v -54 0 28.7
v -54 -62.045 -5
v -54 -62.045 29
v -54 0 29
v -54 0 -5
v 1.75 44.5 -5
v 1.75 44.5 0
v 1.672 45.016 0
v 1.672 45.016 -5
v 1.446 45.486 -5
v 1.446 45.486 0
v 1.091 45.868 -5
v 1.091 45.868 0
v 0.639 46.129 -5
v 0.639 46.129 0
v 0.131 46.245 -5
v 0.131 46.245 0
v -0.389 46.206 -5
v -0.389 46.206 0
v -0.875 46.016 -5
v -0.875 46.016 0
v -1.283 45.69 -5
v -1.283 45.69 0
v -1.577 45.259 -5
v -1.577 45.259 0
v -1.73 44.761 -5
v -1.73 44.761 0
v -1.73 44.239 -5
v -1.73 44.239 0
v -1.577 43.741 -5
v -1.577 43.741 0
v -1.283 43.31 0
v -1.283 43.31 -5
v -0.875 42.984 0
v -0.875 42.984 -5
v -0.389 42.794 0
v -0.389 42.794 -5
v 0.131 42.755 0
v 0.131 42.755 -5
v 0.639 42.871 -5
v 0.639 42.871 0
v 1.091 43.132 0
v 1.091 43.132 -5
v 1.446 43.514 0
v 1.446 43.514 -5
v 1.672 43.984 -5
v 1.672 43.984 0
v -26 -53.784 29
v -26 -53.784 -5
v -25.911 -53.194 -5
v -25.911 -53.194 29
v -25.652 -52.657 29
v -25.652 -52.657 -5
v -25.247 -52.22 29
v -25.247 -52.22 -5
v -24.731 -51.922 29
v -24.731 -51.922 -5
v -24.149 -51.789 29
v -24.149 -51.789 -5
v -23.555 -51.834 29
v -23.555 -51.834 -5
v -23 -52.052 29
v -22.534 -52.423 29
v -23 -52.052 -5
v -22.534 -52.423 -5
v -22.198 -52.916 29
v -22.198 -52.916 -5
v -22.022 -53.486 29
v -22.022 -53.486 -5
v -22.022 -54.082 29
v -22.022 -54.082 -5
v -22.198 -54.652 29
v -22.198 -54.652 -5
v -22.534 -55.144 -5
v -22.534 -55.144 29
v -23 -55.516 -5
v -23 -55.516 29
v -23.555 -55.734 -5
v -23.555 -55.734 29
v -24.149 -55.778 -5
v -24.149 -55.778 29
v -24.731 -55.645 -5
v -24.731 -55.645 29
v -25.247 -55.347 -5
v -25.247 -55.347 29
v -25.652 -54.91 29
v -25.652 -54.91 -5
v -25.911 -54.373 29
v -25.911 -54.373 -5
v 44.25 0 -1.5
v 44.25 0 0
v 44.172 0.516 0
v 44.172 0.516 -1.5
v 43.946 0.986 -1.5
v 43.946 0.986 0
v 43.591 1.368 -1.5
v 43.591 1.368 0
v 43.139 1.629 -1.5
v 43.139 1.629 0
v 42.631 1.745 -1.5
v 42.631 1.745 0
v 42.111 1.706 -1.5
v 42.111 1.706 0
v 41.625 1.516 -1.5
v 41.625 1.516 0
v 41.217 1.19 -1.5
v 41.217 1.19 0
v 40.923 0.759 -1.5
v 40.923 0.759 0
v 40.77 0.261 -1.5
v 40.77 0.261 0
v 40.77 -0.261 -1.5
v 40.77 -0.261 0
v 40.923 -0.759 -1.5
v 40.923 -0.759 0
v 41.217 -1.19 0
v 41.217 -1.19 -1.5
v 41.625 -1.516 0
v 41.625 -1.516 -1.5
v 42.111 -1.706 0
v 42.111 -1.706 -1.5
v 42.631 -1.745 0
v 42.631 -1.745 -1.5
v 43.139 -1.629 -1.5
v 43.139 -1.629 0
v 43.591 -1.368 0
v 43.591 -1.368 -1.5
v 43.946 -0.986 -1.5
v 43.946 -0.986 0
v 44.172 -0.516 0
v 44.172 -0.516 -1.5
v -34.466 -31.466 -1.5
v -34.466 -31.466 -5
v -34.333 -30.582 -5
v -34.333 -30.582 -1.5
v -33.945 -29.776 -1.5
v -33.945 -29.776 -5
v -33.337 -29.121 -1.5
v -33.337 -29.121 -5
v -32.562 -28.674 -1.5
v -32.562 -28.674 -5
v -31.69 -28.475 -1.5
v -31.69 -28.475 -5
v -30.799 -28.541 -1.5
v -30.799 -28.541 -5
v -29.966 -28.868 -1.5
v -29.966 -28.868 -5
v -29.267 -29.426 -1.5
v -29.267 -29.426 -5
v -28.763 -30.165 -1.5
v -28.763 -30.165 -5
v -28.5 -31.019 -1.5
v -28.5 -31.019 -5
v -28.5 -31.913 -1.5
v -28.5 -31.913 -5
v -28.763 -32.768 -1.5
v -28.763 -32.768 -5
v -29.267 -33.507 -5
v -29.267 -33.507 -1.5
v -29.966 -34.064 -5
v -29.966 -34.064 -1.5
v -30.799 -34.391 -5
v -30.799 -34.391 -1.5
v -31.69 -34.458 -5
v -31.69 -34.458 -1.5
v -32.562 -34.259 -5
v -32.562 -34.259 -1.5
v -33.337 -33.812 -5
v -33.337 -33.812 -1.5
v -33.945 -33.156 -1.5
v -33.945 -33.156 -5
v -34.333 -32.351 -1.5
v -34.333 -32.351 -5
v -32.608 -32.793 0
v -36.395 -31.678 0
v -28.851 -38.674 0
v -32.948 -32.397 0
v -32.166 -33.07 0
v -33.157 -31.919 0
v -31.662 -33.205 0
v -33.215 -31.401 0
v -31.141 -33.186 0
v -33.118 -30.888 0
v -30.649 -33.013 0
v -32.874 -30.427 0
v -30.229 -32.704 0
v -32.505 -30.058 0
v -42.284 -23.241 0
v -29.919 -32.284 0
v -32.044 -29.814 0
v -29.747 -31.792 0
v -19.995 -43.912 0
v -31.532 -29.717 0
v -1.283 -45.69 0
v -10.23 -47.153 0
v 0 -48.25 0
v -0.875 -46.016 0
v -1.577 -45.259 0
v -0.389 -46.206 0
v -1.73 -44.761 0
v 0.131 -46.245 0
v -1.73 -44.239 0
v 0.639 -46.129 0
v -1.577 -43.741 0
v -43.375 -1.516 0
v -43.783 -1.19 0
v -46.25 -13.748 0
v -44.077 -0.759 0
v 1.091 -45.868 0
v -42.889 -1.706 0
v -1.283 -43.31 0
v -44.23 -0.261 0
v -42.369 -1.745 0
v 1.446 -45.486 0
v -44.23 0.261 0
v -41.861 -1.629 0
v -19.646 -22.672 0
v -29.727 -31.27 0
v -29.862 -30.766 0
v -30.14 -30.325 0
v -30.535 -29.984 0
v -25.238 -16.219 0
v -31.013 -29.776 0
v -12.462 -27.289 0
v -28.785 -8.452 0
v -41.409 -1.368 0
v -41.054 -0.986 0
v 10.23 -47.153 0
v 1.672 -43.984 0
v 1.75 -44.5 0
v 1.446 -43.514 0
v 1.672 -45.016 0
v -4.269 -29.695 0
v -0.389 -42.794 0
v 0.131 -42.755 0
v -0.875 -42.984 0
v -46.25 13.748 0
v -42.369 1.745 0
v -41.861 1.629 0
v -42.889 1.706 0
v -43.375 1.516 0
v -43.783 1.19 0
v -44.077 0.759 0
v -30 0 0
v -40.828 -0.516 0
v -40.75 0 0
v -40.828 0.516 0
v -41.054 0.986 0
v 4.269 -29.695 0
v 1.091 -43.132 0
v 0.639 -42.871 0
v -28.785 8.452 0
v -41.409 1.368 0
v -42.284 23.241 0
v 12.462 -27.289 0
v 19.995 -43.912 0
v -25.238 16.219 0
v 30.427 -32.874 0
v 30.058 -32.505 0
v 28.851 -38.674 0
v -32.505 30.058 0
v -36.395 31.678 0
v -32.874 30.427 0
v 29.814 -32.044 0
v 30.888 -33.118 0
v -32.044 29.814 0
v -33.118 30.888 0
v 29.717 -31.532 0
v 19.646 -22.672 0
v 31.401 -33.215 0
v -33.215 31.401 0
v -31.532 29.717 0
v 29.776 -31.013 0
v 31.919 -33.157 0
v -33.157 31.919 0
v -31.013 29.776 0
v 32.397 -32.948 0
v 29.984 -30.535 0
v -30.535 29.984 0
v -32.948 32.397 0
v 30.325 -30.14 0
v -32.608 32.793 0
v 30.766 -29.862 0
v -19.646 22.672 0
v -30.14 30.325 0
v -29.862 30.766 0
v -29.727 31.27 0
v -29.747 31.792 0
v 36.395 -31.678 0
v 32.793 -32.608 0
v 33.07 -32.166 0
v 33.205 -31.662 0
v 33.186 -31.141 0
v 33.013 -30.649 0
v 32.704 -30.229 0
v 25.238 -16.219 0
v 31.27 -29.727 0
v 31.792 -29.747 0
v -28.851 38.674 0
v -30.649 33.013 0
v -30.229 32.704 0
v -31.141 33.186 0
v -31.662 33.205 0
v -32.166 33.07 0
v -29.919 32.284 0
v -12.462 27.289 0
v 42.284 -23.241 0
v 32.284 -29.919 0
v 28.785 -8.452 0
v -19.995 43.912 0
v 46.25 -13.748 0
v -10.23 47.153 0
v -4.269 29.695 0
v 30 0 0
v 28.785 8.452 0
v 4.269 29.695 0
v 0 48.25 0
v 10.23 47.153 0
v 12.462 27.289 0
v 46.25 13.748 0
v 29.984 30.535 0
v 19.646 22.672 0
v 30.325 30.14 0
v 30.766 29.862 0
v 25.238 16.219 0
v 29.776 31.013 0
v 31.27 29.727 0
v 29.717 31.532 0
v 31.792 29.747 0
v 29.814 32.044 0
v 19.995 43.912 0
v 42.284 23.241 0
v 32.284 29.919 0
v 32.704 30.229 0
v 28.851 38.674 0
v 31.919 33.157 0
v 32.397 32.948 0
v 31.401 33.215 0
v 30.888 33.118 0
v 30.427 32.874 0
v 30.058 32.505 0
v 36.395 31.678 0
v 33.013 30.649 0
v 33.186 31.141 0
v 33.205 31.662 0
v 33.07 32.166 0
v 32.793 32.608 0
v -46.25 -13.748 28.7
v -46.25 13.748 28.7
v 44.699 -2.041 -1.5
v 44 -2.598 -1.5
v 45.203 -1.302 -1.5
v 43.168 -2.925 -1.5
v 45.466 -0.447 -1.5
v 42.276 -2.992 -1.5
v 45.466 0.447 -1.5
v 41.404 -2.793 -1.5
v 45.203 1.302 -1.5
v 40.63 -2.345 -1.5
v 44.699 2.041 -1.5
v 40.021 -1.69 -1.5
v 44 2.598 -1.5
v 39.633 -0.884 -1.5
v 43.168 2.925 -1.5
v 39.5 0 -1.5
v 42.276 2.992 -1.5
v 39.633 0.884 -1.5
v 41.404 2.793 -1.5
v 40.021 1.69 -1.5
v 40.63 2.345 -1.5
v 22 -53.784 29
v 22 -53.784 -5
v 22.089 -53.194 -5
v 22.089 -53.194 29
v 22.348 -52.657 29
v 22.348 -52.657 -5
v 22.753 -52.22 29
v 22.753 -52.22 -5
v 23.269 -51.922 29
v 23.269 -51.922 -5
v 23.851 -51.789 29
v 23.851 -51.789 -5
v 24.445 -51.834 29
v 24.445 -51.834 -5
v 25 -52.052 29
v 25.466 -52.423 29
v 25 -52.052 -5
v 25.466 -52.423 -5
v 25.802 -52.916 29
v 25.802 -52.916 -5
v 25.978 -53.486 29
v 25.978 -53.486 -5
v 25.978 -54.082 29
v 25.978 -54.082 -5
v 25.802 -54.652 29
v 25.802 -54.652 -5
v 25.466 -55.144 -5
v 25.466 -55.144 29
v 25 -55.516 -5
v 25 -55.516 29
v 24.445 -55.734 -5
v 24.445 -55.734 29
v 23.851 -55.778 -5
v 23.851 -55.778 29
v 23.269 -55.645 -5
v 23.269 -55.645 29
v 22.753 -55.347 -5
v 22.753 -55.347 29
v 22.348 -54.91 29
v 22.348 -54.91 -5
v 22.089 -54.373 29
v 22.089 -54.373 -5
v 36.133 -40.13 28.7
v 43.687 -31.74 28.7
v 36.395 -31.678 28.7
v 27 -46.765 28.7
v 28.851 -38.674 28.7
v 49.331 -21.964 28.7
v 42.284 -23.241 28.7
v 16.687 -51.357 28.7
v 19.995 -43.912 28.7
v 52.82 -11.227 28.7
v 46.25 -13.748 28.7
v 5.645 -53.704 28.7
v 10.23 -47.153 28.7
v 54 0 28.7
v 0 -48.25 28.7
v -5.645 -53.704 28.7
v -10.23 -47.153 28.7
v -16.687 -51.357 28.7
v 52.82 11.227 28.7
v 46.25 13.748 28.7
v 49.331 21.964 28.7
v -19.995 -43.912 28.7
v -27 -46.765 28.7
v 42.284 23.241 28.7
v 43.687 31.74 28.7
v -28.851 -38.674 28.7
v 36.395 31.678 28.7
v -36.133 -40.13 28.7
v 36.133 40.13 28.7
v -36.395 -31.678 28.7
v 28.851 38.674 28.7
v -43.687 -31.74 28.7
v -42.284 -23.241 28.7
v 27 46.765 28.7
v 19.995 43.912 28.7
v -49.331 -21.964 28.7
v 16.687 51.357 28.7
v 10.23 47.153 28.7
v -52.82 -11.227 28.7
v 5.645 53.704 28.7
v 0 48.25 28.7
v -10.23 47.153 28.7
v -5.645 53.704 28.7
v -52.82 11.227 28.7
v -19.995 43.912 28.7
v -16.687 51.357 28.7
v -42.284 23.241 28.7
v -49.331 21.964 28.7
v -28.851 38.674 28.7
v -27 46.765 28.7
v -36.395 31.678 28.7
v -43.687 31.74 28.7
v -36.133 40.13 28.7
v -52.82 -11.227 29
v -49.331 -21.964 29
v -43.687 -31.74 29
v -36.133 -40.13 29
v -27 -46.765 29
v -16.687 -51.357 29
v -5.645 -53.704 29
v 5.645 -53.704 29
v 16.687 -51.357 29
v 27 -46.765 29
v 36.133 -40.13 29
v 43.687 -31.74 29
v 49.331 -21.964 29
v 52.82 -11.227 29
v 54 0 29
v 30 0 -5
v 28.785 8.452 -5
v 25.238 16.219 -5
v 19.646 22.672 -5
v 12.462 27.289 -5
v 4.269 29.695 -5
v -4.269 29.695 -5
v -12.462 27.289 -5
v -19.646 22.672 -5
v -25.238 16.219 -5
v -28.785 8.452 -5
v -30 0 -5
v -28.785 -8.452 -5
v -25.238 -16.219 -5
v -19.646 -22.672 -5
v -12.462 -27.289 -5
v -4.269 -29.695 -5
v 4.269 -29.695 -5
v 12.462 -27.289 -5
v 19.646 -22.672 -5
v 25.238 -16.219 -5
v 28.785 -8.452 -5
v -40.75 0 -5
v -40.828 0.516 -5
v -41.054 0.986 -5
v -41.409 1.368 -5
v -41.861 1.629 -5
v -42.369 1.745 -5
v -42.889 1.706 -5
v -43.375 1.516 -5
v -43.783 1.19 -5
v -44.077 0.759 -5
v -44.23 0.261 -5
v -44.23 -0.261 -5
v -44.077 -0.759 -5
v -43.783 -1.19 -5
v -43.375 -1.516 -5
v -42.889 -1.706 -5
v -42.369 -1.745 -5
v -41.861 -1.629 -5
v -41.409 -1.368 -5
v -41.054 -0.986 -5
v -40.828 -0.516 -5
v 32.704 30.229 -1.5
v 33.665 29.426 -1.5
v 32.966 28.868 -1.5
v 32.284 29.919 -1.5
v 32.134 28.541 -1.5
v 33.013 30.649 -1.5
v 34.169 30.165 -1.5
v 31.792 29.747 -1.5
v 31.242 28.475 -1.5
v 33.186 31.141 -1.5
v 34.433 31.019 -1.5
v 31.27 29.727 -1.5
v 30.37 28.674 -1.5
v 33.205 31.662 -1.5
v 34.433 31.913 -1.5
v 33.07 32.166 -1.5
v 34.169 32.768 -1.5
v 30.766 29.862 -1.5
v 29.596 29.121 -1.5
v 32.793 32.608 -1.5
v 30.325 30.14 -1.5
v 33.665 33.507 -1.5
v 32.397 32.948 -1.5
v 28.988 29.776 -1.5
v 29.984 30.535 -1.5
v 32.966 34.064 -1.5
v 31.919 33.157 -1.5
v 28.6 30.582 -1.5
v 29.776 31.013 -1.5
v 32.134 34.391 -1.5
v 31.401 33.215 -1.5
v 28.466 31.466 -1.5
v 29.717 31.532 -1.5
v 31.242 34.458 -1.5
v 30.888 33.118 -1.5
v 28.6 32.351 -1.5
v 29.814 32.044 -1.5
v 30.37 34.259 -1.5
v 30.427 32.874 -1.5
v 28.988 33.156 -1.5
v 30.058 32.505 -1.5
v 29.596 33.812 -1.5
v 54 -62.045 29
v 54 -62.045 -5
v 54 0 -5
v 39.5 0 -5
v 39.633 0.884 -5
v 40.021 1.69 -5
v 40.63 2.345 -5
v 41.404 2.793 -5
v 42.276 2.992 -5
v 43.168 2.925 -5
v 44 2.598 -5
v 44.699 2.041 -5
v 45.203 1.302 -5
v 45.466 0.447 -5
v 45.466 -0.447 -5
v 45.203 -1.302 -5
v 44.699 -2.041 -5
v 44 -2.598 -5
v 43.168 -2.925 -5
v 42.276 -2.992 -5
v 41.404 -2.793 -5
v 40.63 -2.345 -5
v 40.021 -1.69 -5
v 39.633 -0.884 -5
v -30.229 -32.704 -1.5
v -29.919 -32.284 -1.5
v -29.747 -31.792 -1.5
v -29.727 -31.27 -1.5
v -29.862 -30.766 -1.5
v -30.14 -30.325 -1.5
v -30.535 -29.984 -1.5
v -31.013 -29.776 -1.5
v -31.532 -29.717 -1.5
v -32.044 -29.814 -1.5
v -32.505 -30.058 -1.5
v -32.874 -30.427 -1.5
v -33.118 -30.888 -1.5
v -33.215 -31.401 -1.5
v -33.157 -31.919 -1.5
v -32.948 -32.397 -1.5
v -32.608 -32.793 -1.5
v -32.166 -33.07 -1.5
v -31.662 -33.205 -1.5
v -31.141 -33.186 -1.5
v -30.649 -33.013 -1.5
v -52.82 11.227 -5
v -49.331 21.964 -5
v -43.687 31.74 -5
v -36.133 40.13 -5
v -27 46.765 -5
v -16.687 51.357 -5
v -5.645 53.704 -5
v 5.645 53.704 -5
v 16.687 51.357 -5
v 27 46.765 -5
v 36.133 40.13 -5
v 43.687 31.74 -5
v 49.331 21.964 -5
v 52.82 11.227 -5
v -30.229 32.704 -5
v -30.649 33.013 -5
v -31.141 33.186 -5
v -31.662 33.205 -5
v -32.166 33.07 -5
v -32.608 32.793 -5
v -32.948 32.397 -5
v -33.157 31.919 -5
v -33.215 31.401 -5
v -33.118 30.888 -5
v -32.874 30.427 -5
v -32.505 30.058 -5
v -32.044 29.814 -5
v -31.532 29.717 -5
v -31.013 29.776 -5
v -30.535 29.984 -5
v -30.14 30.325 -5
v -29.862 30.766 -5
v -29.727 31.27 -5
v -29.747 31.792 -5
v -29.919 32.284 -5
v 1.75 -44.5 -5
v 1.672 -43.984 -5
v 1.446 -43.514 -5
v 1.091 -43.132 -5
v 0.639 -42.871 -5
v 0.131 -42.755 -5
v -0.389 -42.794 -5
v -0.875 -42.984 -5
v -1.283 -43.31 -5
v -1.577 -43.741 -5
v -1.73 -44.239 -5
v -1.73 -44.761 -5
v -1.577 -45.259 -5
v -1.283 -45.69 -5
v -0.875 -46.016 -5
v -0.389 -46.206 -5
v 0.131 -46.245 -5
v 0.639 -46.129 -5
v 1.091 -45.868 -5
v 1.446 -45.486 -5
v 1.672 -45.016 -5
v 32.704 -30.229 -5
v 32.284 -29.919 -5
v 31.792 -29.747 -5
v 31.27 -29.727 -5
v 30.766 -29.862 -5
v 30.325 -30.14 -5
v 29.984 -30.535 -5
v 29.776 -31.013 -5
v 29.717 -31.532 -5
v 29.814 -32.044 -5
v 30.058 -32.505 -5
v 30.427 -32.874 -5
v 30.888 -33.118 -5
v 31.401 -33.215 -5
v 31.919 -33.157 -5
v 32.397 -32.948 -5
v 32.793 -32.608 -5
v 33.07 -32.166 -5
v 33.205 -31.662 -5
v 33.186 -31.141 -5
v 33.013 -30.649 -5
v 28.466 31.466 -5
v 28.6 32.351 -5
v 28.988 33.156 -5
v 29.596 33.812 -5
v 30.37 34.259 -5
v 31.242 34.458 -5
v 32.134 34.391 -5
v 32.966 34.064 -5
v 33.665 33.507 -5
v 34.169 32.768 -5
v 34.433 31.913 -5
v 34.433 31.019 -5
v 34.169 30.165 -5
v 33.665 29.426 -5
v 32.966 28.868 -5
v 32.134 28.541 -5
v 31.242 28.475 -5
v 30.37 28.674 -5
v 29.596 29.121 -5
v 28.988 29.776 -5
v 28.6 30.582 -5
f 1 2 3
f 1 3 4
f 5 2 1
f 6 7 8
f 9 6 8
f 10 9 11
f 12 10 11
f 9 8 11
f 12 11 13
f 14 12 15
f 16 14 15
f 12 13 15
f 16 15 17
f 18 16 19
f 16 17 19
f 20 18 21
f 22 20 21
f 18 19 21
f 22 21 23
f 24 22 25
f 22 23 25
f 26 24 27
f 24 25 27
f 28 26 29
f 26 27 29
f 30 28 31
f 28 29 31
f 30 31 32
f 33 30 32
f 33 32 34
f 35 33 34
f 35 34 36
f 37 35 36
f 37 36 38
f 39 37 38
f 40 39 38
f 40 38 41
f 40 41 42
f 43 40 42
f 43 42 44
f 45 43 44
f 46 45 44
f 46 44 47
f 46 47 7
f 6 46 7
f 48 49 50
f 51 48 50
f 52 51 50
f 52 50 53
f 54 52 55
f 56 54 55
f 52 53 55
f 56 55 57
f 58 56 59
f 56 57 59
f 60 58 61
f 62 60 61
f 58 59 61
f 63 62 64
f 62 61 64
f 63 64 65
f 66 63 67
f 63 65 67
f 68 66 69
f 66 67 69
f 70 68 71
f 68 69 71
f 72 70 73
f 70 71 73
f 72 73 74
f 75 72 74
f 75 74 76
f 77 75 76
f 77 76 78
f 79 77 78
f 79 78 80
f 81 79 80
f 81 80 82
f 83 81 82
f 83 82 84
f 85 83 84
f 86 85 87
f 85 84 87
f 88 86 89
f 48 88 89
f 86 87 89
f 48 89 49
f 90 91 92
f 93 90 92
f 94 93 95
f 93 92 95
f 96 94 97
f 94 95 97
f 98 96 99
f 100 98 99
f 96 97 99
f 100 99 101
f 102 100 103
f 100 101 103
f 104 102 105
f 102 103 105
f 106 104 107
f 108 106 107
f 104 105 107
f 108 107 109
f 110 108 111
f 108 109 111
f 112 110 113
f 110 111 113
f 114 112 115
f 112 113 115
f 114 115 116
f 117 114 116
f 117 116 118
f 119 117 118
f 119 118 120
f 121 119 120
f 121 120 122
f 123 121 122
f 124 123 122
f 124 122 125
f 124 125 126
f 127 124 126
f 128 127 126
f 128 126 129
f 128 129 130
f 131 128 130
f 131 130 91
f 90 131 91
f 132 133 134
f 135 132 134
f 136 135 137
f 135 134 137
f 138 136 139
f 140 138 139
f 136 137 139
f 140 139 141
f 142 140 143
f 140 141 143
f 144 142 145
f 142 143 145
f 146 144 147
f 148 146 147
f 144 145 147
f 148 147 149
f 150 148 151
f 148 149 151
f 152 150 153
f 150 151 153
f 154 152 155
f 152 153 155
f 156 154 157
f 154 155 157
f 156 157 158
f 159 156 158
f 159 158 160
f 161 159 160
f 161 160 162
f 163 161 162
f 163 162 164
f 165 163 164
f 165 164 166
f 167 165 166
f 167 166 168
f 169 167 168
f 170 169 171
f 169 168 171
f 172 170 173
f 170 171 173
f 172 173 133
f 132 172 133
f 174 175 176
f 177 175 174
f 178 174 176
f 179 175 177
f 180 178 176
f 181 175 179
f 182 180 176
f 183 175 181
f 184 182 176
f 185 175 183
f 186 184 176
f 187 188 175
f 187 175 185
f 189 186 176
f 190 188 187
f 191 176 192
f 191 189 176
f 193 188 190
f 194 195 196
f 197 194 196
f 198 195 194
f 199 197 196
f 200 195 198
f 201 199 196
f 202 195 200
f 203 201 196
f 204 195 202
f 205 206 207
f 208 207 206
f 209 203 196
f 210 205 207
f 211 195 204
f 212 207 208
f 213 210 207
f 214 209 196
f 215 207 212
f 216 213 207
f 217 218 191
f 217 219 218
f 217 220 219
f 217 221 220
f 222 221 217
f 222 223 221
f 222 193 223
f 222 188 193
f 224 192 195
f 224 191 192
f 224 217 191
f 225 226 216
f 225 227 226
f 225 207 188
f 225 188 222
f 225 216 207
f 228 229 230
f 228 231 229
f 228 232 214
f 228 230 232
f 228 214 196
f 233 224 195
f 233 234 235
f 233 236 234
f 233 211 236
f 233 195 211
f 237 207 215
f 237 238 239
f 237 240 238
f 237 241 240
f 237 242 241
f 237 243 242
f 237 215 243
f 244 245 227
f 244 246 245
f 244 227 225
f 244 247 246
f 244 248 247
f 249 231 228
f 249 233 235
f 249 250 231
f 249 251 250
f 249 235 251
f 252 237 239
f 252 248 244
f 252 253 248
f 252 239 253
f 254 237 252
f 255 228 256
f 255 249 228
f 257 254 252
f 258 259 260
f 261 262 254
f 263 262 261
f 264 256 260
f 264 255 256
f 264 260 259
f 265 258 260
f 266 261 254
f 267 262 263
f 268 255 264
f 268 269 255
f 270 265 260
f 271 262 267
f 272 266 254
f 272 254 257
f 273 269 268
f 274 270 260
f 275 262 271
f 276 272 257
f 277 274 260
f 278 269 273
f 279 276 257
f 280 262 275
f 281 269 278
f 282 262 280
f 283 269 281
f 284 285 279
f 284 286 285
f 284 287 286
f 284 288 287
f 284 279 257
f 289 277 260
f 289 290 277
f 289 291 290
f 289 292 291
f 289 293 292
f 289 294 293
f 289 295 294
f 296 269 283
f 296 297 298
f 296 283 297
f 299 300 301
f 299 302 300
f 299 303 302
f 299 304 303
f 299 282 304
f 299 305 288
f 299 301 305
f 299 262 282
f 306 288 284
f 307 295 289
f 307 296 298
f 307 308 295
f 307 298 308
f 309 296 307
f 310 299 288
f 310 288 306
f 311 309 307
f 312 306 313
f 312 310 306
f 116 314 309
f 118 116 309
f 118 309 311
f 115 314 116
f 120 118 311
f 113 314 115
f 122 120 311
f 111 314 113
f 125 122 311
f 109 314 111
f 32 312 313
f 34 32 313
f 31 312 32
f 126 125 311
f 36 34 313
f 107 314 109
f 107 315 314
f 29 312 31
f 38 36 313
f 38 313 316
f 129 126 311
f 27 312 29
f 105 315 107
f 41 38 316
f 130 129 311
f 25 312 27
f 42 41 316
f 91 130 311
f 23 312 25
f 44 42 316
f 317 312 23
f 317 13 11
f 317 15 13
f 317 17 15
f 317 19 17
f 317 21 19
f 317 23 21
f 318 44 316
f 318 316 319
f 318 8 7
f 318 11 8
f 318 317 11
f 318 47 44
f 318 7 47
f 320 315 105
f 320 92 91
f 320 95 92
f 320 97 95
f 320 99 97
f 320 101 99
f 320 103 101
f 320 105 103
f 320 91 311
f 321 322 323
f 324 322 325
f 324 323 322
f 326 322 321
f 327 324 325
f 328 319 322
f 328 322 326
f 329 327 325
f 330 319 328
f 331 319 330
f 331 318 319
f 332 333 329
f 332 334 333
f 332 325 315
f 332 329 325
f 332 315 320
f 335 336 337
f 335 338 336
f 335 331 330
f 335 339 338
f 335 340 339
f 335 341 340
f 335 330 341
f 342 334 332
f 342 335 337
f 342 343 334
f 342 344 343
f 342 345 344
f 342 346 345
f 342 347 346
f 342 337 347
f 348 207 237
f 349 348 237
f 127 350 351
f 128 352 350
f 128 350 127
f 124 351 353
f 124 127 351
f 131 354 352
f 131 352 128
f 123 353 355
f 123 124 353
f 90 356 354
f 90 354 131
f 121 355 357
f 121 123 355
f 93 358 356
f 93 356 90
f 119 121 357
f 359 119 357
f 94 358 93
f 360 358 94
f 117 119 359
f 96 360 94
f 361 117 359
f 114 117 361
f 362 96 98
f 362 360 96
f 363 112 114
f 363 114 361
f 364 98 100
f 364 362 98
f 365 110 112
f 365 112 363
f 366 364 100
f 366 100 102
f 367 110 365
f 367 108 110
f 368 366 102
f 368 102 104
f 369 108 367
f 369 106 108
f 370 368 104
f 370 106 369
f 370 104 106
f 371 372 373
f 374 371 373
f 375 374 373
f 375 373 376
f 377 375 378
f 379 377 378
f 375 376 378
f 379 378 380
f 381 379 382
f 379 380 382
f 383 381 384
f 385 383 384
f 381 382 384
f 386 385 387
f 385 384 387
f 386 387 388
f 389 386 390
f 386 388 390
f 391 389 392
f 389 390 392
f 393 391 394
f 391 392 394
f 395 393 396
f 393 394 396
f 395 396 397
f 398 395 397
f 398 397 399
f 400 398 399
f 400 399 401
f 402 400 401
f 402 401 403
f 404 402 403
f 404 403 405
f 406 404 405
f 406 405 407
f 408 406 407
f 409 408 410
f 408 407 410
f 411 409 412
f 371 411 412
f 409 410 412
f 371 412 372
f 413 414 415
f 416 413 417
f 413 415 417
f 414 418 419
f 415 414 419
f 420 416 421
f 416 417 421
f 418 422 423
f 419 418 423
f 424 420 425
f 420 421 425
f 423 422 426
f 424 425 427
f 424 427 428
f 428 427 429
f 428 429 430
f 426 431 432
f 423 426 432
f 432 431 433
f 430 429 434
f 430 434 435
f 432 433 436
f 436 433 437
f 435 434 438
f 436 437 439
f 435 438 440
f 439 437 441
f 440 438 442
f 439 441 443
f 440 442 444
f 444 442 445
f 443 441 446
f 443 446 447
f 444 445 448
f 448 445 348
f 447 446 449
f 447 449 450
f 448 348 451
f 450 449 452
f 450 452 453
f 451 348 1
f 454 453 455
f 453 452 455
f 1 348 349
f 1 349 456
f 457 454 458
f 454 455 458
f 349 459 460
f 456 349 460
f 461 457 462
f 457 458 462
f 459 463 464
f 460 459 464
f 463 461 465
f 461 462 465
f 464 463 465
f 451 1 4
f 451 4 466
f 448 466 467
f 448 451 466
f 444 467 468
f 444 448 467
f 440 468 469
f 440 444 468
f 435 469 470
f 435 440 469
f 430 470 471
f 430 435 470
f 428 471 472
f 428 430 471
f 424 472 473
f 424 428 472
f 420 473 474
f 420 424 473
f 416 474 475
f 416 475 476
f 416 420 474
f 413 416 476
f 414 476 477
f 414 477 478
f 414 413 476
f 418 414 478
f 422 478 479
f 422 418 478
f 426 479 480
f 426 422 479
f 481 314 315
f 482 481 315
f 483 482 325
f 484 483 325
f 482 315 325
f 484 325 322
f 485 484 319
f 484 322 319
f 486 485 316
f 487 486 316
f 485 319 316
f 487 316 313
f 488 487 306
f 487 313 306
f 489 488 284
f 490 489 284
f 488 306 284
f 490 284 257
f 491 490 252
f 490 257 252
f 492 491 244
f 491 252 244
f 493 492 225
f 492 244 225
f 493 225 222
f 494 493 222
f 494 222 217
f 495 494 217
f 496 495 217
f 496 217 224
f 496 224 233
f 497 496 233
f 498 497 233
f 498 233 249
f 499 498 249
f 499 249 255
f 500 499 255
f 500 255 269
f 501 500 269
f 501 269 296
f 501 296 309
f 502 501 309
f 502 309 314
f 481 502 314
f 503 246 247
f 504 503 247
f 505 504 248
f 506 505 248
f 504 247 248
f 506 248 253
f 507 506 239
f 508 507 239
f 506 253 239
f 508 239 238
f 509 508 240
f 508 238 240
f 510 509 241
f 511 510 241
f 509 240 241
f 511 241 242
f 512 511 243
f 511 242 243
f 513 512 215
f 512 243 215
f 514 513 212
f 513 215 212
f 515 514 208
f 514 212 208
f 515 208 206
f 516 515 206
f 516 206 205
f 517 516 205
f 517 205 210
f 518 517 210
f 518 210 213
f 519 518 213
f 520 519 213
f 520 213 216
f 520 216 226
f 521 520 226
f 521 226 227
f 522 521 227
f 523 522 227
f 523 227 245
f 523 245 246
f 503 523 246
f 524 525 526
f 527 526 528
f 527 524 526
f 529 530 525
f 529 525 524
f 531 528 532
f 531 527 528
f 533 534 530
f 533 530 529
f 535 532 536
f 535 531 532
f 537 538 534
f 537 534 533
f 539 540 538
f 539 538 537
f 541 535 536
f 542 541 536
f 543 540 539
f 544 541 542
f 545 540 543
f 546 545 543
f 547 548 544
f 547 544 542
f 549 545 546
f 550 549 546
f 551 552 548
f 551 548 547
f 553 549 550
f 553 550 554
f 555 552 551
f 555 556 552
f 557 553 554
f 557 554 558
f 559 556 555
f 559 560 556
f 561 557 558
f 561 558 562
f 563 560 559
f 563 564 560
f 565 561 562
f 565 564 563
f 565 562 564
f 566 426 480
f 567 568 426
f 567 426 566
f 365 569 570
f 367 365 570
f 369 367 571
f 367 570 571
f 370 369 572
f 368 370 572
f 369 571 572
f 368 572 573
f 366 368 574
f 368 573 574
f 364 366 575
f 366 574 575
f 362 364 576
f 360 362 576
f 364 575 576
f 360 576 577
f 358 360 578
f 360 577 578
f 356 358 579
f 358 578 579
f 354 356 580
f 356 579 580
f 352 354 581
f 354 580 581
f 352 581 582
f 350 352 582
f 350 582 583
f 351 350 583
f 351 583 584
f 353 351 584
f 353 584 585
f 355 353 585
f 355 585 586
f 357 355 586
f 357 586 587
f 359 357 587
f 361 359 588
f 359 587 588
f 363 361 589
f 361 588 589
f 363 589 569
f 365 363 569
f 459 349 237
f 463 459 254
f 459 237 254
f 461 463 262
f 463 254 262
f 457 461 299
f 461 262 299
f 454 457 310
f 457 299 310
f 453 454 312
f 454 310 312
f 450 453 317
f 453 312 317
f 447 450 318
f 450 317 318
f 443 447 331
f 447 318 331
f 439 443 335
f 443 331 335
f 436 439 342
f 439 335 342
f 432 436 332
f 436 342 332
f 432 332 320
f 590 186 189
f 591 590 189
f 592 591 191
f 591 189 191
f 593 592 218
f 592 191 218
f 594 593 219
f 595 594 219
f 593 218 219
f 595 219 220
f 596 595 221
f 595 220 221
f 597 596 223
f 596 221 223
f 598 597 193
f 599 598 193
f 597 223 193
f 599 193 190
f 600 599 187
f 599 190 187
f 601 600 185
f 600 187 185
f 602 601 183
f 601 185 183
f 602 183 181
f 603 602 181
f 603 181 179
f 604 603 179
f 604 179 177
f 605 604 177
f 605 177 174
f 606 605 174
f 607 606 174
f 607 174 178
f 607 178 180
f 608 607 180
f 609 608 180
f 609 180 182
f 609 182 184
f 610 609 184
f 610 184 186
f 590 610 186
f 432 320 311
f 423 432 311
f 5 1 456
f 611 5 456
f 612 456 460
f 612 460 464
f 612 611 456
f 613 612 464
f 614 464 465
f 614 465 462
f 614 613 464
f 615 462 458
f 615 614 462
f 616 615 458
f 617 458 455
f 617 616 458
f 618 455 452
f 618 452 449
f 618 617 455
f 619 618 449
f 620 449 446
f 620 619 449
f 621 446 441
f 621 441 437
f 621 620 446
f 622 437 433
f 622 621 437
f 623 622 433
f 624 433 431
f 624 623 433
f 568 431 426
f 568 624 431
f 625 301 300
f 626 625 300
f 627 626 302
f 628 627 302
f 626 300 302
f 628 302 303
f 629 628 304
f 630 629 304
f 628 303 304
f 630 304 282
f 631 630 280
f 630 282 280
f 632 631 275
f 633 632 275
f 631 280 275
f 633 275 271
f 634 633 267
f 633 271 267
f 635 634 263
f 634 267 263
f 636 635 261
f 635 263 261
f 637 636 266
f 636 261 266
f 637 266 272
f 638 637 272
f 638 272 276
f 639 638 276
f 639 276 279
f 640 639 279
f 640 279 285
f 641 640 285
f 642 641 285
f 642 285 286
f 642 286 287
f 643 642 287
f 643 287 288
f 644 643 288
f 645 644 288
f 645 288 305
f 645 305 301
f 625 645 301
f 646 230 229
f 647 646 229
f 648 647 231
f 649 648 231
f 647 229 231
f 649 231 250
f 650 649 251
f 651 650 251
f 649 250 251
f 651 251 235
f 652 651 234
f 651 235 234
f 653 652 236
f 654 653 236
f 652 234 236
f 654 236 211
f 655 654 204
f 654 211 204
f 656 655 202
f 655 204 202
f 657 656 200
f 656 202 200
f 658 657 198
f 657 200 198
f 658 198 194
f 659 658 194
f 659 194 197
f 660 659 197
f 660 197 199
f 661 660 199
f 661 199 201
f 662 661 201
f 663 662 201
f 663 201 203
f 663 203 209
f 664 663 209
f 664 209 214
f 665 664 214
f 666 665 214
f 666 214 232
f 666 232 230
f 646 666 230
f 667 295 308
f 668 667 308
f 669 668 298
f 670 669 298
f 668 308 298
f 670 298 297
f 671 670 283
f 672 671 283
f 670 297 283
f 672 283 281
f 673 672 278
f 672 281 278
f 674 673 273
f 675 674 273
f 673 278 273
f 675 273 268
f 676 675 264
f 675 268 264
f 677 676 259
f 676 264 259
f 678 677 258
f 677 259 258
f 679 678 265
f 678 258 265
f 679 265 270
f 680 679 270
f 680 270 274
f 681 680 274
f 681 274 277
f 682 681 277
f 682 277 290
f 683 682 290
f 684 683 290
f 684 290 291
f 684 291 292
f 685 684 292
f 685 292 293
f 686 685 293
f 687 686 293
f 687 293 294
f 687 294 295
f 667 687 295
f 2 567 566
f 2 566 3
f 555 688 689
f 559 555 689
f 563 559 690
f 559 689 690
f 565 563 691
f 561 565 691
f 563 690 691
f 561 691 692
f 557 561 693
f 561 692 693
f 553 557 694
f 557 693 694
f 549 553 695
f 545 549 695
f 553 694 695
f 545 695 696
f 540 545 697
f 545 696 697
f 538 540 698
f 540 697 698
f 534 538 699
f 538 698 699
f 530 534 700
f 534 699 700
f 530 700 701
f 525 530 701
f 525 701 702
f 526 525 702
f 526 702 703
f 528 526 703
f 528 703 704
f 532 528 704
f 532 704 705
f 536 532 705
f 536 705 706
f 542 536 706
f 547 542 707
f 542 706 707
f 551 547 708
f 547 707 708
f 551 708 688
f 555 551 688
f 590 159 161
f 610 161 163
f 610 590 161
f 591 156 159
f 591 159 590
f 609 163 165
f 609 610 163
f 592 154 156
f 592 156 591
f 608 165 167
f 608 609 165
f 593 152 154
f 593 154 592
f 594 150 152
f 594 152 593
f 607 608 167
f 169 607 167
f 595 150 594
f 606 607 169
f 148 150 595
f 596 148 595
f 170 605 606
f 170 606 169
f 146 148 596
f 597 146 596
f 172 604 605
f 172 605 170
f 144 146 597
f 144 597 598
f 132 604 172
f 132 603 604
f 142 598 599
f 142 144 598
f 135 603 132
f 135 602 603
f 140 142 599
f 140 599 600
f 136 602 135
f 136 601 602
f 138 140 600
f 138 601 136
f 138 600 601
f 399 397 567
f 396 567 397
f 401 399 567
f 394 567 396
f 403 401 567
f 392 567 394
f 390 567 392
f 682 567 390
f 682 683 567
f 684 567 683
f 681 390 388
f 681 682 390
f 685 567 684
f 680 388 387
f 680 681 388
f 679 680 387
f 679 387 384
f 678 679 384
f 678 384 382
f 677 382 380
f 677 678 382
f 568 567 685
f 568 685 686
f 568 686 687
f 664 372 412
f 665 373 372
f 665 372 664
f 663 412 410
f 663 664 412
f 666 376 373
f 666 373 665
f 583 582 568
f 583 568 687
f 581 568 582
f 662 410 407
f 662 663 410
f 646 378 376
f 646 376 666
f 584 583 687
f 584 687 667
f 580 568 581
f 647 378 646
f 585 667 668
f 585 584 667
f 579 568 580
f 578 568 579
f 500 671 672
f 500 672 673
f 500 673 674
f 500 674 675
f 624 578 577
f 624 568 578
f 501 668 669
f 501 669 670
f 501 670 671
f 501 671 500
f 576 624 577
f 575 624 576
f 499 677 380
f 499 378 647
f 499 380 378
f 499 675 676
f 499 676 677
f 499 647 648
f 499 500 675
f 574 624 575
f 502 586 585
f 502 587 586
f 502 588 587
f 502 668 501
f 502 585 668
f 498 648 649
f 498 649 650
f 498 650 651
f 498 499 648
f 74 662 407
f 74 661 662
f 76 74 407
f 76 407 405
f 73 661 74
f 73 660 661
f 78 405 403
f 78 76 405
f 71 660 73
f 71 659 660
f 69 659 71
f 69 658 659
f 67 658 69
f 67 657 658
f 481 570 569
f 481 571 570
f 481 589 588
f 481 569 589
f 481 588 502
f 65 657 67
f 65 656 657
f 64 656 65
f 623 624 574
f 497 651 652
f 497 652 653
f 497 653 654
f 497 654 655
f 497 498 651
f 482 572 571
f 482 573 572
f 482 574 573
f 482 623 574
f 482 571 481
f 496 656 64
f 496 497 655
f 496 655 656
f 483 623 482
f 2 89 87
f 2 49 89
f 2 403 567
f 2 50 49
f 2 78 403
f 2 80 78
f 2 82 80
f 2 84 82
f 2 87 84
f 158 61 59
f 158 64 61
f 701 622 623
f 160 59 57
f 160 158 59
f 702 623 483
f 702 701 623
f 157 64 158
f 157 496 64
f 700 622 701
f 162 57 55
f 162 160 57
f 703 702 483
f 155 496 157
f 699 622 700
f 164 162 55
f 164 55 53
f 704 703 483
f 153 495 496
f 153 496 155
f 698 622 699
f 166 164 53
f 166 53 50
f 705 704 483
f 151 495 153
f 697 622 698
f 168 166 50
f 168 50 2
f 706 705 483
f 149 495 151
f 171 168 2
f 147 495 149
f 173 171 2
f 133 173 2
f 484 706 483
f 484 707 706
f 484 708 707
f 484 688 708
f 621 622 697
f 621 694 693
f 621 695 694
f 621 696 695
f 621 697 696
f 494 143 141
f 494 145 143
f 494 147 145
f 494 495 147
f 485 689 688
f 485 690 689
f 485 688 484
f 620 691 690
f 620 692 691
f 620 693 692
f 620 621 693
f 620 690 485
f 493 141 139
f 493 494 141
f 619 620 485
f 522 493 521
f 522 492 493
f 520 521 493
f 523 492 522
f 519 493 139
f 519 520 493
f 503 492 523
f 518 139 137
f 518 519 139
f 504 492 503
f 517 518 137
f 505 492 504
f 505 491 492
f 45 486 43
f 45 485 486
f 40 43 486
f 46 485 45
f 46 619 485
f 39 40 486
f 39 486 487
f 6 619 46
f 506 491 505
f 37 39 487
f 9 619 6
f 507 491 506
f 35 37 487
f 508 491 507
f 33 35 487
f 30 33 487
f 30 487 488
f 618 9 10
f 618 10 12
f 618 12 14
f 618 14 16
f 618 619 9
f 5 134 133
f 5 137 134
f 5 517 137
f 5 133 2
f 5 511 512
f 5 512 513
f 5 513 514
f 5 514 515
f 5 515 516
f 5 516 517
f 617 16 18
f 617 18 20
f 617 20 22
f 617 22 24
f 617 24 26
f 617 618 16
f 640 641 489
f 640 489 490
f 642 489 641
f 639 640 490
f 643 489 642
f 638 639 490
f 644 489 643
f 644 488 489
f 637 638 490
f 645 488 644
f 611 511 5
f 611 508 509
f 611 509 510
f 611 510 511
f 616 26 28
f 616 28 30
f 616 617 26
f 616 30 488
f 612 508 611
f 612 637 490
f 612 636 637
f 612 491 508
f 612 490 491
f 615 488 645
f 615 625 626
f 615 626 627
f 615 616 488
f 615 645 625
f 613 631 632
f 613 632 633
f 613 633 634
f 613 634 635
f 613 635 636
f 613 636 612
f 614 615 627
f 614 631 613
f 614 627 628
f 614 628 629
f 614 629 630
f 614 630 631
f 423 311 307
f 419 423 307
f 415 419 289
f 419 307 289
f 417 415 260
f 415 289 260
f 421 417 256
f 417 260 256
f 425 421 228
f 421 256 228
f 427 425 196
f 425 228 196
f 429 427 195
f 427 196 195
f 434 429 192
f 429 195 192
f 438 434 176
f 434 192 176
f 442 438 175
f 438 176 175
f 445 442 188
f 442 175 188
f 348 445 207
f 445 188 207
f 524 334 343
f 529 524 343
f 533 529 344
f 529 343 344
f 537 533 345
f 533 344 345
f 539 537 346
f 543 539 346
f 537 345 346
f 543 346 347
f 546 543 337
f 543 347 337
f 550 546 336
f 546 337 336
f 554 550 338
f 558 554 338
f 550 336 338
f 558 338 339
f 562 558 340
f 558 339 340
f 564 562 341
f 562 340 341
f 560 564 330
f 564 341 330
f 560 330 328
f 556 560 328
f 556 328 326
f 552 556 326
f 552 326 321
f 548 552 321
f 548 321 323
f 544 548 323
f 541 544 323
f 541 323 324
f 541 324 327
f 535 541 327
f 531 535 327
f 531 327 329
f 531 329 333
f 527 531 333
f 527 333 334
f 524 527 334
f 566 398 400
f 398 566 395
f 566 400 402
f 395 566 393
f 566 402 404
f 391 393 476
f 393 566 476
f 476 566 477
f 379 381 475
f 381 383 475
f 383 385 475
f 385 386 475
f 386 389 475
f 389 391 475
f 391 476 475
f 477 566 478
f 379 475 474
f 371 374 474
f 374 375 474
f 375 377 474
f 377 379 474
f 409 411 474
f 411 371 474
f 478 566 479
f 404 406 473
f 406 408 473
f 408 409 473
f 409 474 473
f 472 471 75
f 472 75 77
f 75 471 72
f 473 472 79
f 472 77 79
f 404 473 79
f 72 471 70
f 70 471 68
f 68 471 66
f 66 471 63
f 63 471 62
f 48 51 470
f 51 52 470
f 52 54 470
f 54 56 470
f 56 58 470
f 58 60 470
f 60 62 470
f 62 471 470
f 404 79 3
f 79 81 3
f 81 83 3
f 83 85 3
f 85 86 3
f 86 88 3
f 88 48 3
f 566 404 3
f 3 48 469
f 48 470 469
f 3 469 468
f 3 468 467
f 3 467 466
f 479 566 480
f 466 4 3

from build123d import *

# Parameters (mm, degrees)
SKETCH1_R           = 48.25
BOSS_EXTRUDE1_DEPTH = 5
SKETCH2_W           = 17.162038191
SKETCH2_H           = 56.822210482
SKETCH2_W_2         = 16.152506533
SKETCH2_H_2         = 65.186901365
CUT_EXTRUDE1_DEPTH  = 8
SKETCH3_R           = 30
CUT_EXTRUDE2_DEPTH  = 8
SKETCH4_R           = 1.75
CUT_EXTRUDE3_DEPTH  = 10
SKETCH6_R           = 1.75
CUT_EXTRUDE4_DEPTH  = 10
CIRPATTERN2_COUNT   = 2
CIRPATTERN2_ANGLE   = 45
CIRPATTERN3_COUNT   = 2
CIRPATTERN3_ANGLE   = 45
SKETCH7_R           = 1.75
CUT_EXTRUDE5_DEPTH  = 10
CIRPATTERN4_COUNT   = 2
CIRPATTERN4_ANGLE   = 45
CIRPATTERN5_COUNT   = 2
CIRPATTERN5_ANGLE   = 315
SKETCH8_R           = 54
BOSS_EXTRUDE3_DEPTH = 33.7
SKETCH10_R          = 3
CUT_EXTRUDE6_DEPTH  = 3.5
SKETCH12_R          = 3
CUT_EXTRUDE7_DEPTH  = 3.5
SKETCH11_R          = 3
CUT_EXTRUDE8_DEPTH  = 3.5
BOSS_EXTRUDE4_DEPTH = 34
SKETCH14_R          = 2
CUT_EXTRUDE9_DEPTH  = 34


with BuildPart() as part:
    # Sketch1 → Boss-Extrude1 (new body)
    with BuildSketch(Plane.XY):
        Circle(SKETCH1_R)
    extrude(amount=-BOSS_EXTRUDE1_DEPTH)

    # Sketch2 → Cut-Extrude1 (cut)
    with BuildSketch(Plane.XY):
        with Locations((-54.831019095, 0)):
            Rectangle(SKETCH2_W, SKETCH2_H)
        with Locations((54.326253267, -4.182345442)):
            Rectangle(SKETCH2_W_2, SKETCH2_H_2)
    extrude(amount=-CUT_EXTRUDE1_DEPTH, mode=Mode.SUBTRACT)

    # Sketch3 → Cut-Extrude2 (cut)
    with BuildSketch(Plane.XY):
        Circle(SKETCH3_R)
    extrude(amount=-CUT_EXTRUDE2_DEPTH, mode=Mode.SUBTRACT)

    # Sketch4 → Cut-Extrude3 (cut)
    with BuildSketch(Plane.XY):
        with Locations((-42.5, 0)):
            Circle(SKETCH4_R)
        with Locations((42.5, 0)):
            Circle(SKETCH4_R)
    extrude(amount=-CUT_EXTRUDE3_DEPTH, mode=Mode.SUBTRACT)

    # Sketch6 → Cut-Extrude4 (cut)
    with BuildSketch(Plane.XY):
        with Locations((0, 44.5)):
            Circle(SKETCH6_R)
    cut_extrude4 = extrude(amount=-CUT_EXTRUDE4_DEPTH, mode=Mode.SUBTRACT)

    # CirPattern2: Cut-Extrude4 ×2 about axis
    cirpattern2_axis = Axis((0, 0, -8), (0, 0, 1))
    for i in range(1, CIRPATTERN2_COUNT):
        add(cut_extrude4.rotate(cirpattern2_axis, i * CIRPATTERN2_ANGLE / (CIRPATTERN2_COUNT - 1)), mode=Mode.SUBTRACT)

    # CirPattern3: Cut-Extrude4 ×2 about axis
    cirpattern3_axis = Axis((0, 0, -8), (0, 0, -1))
    for i in range(1, CIRPATTERN3_COUNT):
        add(cut_extrude4.rotate(cirpattern3_axis, i * CIRPATTERN3_ANGLE / (CIRPATTERN3_COUNT - 1)), mode=Mode.SUBTRACT)

    # Sketch7 → Cut-Extrude5 (cut)
    with BuildSketch(Plane.XY):
        with Locations((0, -44.5)):
            Circle(SKETCH7_R)
    cut_extrude5 = extrude(amount=-CUT_EXTRUDE5_DEPTH, mode=Mode.SUBTRACT)

    # CirPattern4: Cut-Extrude5 ×2 about axis
    cirpattern4_axis = Axis((0, 0, -8), (0, 0, 1))
    for i in range(1, CIRPATTERN4_COUNT):
        add(cut_extrude5.rotate(cirpattern4_axis, i * CIRPATTERN4_ANGLE / (CIRPATTERN4_COUNT - 1)), mode=Mode.SUBTRACT)

    # CirPattern5: Cut-Extrude5 ×2 about axis
    cirpattern5_axis = Axis((0, 0, -8), (0, 0, 1))
    for i in range(1, CIRPATTERN5_COUNT):
        add(cut_extrude5.rotate(cirpattern5_axis, i * CIRPATTERN5_ANGLE / (CIRPATTERN5_COUNT - 1)), mode=Mode.SUBTRACT)

    # Sketch10 → Cut-Extrude6 (cut)
    with BuildSketch(Plane(origin=(0, 0, -5), x_dir=(-1, 0, 0), z_dir=(0, 0, -1))):
        with Locations((-31.466251763, 31.466251763)):
            Circle(SKETCH10_R)
    extrude(amount=-CUT_EXTRUDE6_DEPTH, mode=Mode.SUBTRACT)

    # Sketch12 → Cut-Extrude7 (cut)
    with BuildSketch(Plane(origin=(0, 0, -5), x_dir=(-1, 0, 0), z_dir=(0, 0, -1))):
        with Locations((-42.5, 0)):
            Circle(SKETCH12_R)
    extrude(amount=-CUT_EXTRUDE7_DEPTH, mode=Mode.SUBTRACT)

    # Sketch11 → Cut-Extrude8 (cut)
    with BuildSketch(Plane(origin=(0, 0, -5), x_dir=(-1, 0, 0), z_dir=(0, 0, -1))):
        with Locations((31.466251763, -31.466251763)):
            Circle(SKETCH11_R)
    extrude(amount=-CUT_EXTRUDE8_DEPTH, mode=Mode.SUBTRACT)


with BuildPart() as body_2:
    # Sketch8 → Boss-Extrude3 (new body)
    with BuildSketch(Plane(origin=(0, 0, -5), x_dir=(-1, 0, 0), z_dir=(0, 0, -1))):
        Circle(SKETCH8_R)
        with BuildLine():
            Line((-46.25, 13.747727085), (-46.25, -13.747727085))
            ThreePointArc((-46.25, -13.747727085), (0, -48.25), (46.25, -13.747727085))
            Line((46.25, -13.747727085), (46.25, 13.747727085))
            ThreePointArc((46.25, 13.747727085), (0, 48.25), (-46.25, 13.747727085))
        make_face(mode=Mode.SUBTRACT)
    extrude(amount=-BOSS_EXTRUDE3_DEPTH)


    add(part.part)  # Boss-Extrude4 merges part
    # Sketch13 → Boss-Extrude4 (add)
    with BuildSketch(Plane(origin=(0, 0, -5), x_dir=(-1, 0, 0), z_dir=(0, 0, -1))):
        with BuildLine():
            Line((-54, 0), (-54, -62.045472978))
            Line((-54, -62.045472978), (54, -62.045472978))
            Line((54, -62.045472978), (54, 0))
            ThreePointArc((54, 0), (0, -54), (-54, 0))
        make_face()
    extrude(amount=-BOSS_EXTRUDE4_DEPTH)

    # Sketch14 → Cut-Extrude9 (cut)
    with BuildSketch(Plane(origin=(0, 0, -5), x_dir=(-1, 0, 0), z_dir=(0, 0, -1))):
        with Locations((-24, -53.783750327)):
            Circle(SKETCH14_R)
        with Locations((24, -53.783750327)):
            Circle(SKETCH14_R)
    extrude(amount=-CUT_EXTRUDE9_DEPTH, mode=Mode.SUBTRACT)


solid = body_2.part
